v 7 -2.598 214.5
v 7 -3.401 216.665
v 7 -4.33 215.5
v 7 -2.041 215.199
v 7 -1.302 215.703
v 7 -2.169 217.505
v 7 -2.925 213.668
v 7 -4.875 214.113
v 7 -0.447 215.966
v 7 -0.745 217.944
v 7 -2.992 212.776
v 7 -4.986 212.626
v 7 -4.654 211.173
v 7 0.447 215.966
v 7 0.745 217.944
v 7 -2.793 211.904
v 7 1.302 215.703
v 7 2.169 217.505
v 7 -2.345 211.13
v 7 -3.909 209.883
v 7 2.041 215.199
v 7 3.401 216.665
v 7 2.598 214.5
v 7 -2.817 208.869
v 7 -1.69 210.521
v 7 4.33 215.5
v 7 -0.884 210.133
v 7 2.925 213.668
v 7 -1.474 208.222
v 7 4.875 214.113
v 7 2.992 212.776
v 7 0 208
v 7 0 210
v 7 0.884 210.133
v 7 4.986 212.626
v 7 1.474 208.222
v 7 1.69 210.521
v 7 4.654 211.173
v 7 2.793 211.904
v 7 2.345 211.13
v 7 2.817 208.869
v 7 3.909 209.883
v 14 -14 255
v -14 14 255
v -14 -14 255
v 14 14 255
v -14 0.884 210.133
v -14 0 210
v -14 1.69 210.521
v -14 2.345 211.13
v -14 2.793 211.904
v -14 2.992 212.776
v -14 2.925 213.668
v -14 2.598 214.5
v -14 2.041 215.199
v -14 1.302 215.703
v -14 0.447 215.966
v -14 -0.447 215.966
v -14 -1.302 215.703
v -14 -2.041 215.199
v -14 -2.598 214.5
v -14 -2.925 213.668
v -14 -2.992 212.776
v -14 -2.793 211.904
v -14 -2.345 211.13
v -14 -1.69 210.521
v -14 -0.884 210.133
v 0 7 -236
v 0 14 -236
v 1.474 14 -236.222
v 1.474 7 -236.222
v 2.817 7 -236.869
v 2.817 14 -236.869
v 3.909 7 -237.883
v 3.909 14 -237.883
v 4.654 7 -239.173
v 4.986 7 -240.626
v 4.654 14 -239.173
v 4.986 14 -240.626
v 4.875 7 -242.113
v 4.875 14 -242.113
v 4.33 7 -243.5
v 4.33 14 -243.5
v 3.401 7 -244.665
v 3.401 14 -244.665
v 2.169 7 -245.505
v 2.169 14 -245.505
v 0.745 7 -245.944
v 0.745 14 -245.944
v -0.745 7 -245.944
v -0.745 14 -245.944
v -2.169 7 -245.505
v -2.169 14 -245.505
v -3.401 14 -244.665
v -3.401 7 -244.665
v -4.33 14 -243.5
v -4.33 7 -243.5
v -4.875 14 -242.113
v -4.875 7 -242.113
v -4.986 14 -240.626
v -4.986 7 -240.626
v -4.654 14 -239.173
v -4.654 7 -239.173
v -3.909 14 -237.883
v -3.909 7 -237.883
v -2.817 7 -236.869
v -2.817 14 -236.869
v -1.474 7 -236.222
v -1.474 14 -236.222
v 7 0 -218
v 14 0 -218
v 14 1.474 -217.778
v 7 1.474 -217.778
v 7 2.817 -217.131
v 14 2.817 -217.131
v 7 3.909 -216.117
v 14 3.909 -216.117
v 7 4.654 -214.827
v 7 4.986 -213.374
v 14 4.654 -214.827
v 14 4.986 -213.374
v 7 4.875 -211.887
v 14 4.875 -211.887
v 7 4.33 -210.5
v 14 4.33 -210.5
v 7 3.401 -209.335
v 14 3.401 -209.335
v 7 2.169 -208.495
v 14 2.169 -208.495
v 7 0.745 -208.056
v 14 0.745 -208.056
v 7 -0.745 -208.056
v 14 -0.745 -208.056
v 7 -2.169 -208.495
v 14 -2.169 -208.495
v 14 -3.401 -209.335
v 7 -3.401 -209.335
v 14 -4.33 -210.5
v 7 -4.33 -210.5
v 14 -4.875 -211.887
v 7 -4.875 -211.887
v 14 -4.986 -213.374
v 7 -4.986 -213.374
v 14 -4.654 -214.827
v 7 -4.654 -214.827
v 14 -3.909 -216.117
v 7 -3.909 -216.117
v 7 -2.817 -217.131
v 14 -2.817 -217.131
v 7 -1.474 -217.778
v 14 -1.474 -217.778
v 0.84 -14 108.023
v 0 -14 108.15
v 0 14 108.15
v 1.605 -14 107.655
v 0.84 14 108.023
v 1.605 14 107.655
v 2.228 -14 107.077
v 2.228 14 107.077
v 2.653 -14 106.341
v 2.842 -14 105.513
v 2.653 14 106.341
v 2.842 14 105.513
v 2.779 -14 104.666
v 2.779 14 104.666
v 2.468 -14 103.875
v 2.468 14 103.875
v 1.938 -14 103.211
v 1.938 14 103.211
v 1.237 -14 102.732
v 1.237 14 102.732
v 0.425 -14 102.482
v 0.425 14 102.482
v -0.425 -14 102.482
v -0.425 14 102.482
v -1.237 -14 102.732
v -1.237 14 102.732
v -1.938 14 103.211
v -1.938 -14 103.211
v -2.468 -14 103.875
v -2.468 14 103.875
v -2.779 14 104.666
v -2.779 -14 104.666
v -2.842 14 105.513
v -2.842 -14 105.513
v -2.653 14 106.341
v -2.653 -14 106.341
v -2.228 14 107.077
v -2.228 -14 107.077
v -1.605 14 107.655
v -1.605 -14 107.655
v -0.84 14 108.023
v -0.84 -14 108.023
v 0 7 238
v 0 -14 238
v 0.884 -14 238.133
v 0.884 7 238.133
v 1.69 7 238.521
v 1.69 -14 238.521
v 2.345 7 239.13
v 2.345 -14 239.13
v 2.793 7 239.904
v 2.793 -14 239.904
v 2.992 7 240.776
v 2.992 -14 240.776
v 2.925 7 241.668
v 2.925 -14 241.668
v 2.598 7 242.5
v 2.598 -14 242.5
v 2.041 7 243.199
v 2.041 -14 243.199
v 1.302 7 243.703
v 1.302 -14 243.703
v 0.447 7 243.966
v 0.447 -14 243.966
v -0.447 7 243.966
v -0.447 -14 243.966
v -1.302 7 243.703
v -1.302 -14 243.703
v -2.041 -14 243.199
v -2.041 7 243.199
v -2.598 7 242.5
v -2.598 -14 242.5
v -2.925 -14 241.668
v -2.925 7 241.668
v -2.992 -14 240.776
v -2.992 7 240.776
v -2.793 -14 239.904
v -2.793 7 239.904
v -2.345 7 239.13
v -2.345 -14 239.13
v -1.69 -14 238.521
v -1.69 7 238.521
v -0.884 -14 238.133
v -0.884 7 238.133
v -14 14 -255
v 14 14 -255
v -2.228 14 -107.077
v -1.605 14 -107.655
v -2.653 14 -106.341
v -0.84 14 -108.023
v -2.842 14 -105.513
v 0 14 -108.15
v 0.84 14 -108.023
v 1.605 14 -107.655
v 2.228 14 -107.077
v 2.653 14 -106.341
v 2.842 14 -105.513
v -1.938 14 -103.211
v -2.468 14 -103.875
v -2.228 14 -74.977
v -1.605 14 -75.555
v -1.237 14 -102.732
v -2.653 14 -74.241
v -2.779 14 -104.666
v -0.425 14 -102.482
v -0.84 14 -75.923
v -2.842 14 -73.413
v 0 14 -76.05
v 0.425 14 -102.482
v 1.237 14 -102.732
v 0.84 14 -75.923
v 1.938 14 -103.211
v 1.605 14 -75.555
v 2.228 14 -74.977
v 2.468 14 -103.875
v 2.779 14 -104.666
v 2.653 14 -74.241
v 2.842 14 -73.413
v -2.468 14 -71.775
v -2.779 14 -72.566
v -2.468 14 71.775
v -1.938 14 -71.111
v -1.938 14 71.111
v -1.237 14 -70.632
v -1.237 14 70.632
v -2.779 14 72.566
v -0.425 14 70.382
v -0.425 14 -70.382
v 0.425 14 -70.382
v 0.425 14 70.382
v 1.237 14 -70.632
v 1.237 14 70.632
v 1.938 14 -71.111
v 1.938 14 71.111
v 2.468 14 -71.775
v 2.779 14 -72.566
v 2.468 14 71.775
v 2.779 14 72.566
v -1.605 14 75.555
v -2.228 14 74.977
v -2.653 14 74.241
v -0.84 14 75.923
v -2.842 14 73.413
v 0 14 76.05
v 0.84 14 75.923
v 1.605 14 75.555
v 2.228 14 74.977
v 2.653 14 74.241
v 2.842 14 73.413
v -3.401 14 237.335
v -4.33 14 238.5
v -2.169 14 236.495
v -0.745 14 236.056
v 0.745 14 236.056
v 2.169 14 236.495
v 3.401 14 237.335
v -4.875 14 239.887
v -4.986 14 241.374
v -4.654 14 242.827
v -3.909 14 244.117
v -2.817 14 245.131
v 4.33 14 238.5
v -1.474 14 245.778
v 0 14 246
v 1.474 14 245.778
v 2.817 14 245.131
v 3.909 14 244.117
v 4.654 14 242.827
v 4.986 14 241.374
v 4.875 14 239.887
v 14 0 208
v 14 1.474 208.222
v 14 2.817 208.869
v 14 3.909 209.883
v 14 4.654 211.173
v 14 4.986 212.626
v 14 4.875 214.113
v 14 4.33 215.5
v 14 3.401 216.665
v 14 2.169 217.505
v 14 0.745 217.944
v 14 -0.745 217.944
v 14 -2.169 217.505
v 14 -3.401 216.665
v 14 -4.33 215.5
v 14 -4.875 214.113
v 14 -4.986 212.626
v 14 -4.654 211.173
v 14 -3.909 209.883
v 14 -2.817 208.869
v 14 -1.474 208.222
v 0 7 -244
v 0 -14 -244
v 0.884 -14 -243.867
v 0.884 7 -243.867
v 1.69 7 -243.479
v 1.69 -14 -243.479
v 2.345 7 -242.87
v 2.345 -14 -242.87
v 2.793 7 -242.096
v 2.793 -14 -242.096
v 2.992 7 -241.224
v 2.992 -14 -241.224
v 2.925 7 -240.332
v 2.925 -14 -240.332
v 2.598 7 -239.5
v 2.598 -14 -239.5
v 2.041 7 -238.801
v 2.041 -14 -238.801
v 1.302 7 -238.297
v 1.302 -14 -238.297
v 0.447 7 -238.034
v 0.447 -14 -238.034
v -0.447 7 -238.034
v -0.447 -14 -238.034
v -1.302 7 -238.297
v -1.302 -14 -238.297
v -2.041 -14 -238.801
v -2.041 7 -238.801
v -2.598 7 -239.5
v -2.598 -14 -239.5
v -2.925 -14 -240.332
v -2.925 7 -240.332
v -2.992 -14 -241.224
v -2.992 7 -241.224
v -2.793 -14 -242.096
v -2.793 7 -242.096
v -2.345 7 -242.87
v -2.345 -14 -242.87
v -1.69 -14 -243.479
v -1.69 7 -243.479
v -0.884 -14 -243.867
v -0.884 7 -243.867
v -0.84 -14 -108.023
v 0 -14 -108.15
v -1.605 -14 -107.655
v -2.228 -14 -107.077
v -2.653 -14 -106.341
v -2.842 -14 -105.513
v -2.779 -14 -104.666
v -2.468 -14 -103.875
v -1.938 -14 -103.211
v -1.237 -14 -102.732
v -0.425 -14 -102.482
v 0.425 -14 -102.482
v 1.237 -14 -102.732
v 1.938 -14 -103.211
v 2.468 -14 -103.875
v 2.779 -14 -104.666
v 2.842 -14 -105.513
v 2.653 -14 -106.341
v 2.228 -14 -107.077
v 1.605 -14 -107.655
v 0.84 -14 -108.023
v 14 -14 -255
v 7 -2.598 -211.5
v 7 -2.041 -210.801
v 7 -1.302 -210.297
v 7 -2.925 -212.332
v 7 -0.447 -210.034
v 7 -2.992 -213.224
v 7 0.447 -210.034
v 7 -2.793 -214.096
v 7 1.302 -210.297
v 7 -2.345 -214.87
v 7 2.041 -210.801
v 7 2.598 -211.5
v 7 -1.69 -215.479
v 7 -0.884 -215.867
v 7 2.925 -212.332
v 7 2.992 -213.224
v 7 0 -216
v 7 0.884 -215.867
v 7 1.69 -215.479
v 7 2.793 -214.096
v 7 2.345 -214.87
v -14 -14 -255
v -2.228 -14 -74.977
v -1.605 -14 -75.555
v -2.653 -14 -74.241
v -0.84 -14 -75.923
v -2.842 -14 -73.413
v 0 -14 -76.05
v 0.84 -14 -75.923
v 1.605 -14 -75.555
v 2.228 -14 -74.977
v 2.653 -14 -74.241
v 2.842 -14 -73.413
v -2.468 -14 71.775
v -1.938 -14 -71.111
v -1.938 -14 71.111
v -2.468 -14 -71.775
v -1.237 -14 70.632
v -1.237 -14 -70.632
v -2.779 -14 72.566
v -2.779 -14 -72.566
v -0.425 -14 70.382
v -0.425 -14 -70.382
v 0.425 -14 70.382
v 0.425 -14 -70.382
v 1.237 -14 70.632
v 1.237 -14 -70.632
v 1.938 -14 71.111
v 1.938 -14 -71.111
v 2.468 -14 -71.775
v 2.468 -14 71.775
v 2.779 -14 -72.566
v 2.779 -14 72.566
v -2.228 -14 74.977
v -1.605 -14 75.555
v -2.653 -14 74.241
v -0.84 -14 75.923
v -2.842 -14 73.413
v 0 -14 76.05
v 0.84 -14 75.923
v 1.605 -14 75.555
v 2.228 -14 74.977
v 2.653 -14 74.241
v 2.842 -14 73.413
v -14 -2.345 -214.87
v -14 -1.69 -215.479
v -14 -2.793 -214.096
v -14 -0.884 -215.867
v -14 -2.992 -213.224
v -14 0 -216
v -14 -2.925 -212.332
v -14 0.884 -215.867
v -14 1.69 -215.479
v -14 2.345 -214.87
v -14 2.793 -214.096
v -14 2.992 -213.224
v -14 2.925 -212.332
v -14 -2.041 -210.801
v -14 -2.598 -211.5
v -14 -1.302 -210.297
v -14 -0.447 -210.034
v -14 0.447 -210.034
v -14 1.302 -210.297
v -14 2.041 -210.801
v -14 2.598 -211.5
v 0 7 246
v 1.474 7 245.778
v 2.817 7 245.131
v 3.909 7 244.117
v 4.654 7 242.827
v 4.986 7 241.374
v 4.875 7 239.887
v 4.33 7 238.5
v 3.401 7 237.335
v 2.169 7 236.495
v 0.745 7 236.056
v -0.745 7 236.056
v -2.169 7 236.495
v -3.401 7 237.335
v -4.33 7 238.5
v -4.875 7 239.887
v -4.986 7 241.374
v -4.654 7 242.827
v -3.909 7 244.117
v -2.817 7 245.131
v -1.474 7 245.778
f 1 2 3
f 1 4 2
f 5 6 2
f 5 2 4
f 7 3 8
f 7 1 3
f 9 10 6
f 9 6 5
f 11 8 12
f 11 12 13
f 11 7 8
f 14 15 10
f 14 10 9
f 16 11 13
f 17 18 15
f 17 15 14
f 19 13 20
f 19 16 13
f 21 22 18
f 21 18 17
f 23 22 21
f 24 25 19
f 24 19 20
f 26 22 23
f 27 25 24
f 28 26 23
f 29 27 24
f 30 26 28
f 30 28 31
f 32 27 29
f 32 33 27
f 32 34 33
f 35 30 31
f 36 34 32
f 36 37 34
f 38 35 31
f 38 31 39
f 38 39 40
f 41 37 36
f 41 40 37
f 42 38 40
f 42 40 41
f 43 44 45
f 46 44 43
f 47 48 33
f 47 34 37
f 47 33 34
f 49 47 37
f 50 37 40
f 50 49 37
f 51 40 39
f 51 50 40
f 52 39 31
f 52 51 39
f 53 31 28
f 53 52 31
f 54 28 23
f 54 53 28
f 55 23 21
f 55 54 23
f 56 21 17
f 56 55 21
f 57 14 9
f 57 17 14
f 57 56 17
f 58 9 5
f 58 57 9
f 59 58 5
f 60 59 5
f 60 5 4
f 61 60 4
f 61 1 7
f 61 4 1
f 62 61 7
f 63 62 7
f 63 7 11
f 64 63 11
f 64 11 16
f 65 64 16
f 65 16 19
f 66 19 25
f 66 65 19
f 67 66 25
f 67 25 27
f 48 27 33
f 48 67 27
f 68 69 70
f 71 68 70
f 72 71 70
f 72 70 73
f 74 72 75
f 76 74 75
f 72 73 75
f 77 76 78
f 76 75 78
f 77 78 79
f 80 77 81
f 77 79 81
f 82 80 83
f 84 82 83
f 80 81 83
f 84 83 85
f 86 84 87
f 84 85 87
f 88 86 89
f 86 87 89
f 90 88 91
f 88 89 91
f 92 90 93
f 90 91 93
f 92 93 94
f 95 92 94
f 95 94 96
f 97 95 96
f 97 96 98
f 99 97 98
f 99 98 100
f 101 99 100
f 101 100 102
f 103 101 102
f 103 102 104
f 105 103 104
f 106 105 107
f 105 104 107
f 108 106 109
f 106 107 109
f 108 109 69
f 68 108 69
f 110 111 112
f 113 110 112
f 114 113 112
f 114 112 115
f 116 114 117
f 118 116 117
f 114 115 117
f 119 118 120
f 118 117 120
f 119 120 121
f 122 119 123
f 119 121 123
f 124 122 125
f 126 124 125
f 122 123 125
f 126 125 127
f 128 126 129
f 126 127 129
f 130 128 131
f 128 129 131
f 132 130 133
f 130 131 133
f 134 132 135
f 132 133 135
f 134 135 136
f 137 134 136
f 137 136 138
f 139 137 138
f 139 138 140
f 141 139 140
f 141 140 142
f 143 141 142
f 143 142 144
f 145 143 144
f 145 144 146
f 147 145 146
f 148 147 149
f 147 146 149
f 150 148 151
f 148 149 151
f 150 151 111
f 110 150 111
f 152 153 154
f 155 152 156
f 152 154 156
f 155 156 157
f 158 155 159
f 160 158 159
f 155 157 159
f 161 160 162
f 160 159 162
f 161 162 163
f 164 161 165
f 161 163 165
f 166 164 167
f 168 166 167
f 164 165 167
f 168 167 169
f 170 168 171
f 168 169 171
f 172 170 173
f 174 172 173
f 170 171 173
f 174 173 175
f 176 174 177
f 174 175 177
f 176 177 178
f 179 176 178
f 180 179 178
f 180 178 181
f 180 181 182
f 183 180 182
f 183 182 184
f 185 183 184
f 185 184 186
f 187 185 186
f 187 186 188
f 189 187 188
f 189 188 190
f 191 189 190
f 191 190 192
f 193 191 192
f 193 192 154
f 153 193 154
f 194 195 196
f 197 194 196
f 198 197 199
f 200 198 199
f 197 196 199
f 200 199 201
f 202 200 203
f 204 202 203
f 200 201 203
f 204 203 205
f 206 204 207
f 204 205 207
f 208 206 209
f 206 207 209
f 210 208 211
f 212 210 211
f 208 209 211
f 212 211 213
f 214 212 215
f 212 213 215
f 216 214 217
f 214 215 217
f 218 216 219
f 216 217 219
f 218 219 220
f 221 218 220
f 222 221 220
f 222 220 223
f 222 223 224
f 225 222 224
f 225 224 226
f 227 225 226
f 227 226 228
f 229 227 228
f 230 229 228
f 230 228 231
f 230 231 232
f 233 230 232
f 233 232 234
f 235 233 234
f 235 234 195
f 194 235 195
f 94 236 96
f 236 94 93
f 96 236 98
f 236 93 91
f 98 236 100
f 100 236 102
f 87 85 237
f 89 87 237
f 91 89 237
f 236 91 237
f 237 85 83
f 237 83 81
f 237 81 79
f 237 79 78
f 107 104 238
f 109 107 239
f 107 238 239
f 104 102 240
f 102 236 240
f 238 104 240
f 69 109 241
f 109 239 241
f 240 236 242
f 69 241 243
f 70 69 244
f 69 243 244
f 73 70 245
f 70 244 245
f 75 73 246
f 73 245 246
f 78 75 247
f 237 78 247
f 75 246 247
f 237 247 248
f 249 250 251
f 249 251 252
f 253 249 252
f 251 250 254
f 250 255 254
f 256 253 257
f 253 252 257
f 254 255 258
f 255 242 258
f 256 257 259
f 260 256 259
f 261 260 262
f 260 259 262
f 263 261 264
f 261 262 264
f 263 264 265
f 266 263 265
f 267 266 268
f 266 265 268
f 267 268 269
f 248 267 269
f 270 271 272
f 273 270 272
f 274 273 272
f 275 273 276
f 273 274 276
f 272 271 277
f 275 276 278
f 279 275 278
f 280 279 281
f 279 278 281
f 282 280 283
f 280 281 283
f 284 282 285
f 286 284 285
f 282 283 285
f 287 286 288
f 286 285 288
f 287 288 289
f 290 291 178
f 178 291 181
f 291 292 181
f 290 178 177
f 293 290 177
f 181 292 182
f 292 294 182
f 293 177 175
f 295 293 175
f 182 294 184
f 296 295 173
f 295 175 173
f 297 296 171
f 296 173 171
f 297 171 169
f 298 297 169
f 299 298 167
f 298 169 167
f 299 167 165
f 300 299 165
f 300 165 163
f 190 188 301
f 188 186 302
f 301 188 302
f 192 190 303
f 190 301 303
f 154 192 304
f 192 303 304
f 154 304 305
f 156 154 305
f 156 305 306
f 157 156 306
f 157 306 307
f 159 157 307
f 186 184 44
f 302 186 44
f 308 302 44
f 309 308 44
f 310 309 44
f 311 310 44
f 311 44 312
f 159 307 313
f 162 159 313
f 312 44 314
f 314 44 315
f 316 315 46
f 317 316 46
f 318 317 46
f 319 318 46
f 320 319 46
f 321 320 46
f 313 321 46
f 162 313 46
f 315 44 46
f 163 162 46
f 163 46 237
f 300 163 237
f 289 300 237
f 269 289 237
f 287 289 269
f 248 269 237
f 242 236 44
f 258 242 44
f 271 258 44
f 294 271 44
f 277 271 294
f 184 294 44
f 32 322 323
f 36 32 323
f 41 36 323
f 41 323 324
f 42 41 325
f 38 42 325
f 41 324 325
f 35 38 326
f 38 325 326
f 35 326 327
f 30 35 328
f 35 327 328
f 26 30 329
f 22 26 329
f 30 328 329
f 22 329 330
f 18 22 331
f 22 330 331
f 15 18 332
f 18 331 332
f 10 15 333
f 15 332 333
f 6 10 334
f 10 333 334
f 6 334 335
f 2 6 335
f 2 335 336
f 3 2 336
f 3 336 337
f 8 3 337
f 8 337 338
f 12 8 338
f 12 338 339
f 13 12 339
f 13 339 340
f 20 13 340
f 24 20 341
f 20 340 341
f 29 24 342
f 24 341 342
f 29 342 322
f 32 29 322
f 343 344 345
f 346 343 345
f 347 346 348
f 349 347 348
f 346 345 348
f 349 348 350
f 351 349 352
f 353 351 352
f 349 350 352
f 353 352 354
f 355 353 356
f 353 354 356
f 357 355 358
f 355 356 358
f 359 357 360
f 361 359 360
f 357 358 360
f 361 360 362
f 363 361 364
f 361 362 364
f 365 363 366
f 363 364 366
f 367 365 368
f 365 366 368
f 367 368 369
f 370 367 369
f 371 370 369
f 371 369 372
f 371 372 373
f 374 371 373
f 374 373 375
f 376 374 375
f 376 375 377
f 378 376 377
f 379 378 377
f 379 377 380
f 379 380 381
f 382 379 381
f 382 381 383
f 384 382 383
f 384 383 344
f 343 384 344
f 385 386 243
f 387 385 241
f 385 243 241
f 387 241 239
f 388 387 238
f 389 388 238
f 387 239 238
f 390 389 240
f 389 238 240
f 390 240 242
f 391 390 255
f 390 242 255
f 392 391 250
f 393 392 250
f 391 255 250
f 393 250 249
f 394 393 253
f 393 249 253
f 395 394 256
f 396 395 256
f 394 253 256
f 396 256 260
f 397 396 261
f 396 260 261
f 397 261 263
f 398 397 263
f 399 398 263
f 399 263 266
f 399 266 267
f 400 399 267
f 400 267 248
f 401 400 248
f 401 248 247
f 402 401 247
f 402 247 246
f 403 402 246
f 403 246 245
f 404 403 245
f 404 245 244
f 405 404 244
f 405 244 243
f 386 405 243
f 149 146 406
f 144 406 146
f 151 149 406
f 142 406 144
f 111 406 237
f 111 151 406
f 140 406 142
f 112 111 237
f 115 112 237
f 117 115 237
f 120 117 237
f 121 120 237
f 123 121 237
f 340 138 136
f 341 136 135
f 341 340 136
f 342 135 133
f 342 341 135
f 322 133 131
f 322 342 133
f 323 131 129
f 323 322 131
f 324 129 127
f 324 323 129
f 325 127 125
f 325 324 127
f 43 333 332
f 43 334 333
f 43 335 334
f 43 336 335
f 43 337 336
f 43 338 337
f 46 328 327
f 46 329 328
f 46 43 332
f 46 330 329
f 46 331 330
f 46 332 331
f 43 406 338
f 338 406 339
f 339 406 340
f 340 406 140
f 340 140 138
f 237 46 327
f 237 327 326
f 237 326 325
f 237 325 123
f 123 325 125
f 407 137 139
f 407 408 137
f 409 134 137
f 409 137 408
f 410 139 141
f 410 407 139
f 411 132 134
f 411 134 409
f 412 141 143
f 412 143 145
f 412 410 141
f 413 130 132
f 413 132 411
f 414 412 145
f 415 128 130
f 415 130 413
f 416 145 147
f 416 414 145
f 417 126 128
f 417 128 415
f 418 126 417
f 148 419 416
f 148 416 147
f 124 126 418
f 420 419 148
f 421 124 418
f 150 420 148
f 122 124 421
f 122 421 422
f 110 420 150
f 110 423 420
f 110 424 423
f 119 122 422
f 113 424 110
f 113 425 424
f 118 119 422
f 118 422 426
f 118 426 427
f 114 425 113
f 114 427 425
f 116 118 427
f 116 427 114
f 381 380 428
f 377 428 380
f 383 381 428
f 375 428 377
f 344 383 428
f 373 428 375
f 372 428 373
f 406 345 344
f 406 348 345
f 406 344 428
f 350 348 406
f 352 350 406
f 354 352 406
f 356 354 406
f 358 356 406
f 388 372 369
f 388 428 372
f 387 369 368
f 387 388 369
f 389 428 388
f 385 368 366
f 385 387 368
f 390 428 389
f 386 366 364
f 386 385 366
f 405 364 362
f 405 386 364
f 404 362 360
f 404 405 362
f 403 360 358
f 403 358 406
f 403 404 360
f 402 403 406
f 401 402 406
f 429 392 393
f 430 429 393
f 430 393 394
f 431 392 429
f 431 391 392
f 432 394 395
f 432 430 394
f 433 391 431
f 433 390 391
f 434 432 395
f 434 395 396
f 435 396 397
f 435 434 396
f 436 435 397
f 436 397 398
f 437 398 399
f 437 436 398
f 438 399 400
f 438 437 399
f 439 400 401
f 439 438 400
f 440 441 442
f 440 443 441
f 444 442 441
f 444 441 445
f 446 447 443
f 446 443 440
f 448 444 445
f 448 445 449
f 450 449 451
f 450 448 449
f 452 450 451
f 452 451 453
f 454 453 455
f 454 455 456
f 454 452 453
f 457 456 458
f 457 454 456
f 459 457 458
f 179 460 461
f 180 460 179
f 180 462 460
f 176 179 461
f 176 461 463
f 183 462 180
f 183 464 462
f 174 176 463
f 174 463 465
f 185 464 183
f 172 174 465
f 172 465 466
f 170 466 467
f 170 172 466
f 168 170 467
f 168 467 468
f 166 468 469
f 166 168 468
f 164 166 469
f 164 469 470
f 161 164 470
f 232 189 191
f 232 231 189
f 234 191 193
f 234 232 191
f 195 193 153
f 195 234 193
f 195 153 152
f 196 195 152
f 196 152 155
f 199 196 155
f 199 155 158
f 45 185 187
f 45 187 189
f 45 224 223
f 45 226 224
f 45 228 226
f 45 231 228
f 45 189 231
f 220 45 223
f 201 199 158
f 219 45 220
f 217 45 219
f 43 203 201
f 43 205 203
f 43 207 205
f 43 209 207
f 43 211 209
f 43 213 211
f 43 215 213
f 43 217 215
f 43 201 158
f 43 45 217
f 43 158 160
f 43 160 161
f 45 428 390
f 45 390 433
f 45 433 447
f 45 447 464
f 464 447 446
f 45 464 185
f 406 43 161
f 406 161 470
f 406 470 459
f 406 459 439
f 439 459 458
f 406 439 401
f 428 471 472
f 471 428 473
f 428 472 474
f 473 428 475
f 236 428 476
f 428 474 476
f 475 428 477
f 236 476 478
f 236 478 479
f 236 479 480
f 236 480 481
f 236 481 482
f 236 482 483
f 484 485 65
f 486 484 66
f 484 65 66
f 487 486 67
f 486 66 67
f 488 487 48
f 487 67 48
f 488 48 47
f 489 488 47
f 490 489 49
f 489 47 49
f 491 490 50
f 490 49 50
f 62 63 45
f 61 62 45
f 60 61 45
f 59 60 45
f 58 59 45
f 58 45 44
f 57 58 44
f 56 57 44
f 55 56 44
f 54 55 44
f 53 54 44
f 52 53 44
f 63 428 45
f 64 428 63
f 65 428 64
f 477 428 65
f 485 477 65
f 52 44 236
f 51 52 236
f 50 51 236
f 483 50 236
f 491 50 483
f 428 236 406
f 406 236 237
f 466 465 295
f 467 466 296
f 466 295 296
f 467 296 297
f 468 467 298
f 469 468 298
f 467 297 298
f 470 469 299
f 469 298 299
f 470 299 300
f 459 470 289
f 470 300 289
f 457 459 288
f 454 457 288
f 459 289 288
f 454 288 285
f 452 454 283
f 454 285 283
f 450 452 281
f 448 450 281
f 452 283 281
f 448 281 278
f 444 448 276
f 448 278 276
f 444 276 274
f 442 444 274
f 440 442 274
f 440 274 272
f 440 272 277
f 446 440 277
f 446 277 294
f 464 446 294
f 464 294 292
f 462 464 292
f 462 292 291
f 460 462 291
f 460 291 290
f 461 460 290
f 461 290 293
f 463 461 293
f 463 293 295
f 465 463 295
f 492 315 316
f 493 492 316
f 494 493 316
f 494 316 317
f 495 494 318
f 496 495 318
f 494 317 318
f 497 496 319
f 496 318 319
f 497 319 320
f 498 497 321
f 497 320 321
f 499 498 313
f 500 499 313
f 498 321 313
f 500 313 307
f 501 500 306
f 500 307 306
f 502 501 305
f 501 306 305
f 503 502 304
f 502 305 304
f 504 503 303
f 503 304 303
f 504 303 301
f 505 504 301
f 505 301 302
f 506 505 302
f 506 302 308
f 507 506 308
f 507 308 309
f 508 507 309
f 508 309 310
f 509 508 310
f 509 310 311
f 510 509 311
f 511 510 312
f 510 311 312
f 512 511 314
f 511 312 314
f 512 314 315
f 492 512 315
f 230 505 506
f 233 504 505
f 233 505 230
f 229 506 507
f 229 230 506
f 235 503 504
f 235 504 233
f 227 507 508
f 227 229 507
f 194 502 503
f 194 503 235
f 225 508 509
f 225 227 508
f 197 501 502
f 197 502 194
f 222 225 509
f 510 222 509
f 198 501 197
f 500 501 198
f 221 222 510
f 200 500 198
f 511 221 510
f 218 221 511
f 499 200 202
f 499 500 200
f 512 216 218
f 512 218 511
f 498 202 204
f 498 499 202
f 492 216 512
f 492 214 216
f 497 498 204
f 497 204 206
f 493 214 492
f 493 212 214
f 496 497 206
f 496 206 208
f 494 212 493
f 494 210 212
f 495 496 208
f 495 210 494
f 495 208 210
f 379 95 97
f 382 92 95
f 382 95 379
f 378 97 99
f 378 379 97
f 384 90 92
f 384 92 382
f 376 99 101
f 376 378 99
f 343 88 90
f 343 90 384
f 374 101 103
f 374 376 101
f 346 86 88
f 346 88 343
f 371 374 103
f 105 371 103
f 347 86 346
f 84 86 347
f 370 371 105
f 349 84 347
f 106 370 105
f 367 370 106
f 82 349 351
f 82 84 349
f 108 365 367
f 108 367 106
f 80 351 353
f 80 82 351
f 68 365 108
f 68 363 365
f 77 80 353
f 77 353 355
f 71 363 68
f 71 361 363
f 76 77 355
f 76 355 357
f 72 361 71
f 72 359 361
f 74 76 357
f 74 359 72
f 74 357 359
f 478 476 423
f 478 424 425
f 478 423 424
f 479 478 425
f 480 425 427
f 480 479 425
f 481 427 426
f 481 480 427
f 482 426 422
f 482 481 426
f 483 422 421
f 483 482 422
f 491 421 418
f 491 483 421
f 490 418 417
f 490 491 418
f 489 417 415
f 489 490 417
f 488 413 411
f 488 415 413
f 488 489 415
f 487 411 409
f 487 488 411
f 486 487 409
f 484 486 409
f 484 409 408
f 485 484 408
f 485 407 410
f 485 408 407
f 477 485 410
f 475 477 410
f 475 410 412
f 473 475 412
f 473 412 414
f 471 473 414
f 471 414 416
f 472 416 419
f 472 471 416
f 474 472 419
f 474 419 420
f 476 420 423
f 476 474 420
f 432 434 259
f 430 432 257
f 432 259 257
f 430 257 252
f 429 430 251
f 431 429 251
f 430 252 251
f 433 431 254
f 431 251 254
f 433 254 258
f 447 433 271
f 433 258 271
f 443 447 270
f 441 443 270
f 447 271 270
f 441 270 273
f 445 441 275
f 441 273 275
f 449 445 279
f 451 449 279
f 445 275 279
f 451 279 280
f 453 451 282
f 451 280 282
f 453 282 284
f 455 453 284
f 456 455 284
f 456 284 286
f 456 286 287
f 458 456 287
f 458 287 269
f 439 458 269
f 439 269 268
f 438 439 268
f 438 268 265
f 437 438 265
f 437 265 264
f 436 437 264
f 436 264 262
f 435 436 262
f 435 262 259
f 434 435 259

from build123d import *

# Parameters (mm, degrees)
IZIM1_W                     = 28
IZIM1_H                     = 28
Y_KSEKLIK_EKSTR_ZYON1_DEPTH = 255
IZIM2_R                     = 5
KES_EKSTR_ZYON1_DEPTH       = 7
KES_EKSTR_ZYON2_DEPTH       = 257.914382626
KES_EKSTR_ZYON2_DEPTH_BACK  = 257.914382626
IZIM3_R                     = 3
KES_EKSTR_ZYON3_REACH       = 258.914
IZIM4_R                     = 3
IZIM6_R                     = 5
KES_EKSTR_ZYON5_DEPTH       = 7
IZIM7_R                     = 2.85
KES_EKSTR_ZYON6_DEPTH       = 257.914382626


with BuildPart() as part:
    # Çizim1 → Yükseklik-Ekstrüzyon1 (new, symmetric)
    with BuildSketch(Plane.XY):
        Rectangle(IZIM1_W, IZIM1_H)
    extrude(amount=Y_KSEKLIK_EKSTR_ZYON1_DEPTH, both=True)

    # Çizim2 → Kes-Ekstrüzyon1 (cut)
    with BuildSketch(Plane(origin=(14, 0, 0), x_dir=(0, 0, -1), z_dir=(1, 0, 0))):
        with Locations((-213, 0)):
            Circle(IZIM2_R)
        with Locations((213, 0)):
            Circle(IZIM2_R)
    extrude(amount=-KES_EKSTR_ZYON1_DEPTH, mode=Mode.SUBTRACT)

    # Çizim3 → Kes-Ekstrüzyon2 (cut, two sides: drawn at the far end of the back side and taken through both)
    with BuildSketch(Plane(origin=(14, 0, 0), x_dir=(0, 0, -1), z_dir=(1, 0, 0)).offset(-KES_EKSTR_ZYON2_DEPTH_BACK)):
        with Locations((-213, 0)):
            Circle(IZIM3_R)
        with Locations((213, 0)):
            Circle(IZIM3_R)
    extrude(amount=KES_EKSTR_ZYON2_DEPTH + KES_EKSTR_ZYON2_DEPTH_BACK, mode=Mode.SUBTRACT)

    # Çizim4 → Kes-Ekstrüzyon3 (cut, up to next)
    with BuildSketch(Plane.XZ.offset(14), mode=Mode.PRIVATE) as kes_ekstr_zyon3_sk1:
        with Locations(Location((0, -241, 0), (0, 0, 270))):
            Circle(IZIM4_R)
    kes_ekstr_zyon3_tool1 = extrude(kes_ekstr_zyon3_sk1.sketch, amount=-KES_EKSTR_ZYON3_REACH, mode=Mode.PRIVATE) & part.part
    # Çizim4 → Kes-Ekstrüzyon3 (cut, up to next)
    with BuildSketch(Plane.XZ.offset(14), mode=Mode.PRIVATE) as kes_ekstr_zyon3_sk2:
        with Locations(Location((0, 241, 0), (0, 0, 270))):
            Circle(IZIM4_R)
    kes_ekstr_zyon3_tool2 = extrude(kes_ekstr_zyon3_sk2.sketch, amount=-KES_EKSTR_ZYON3_REACH, mode=Mode.PRIVATE) & part.part
    add(kes_ekstr_zyon3_tool1.solids().sort_by_distance((0, -14, -241))[0], mode=Mode.SUBTRACT)
    add(kes_ekstr_zyon3_tool2.solids().sort_by_distance((0, -14, 241))[0], mode=Mode.SUBTRACT)

    # Çizim6 → Kes-Ekstrüzyon5 (cut)
    with BuildSketch(Plane(origin=(0, 14, 0), x_dir=(1, 0, 0), z_dir=(0, 1, 0))):
        with Locations(Location((0, -241, 0), (0, 0, 270))):
            Circle(IZIM6_R)
        with Locations(Location((0, 241, 0), (0, 0, 270))):
            Circle(IZIM6_R)
    extrude(amount=-KES_EKSTR_ZYON5_DEPTH, mode=Mode.SUBTRACT)

    # Çizim7 → Kes-Ekstrüzyon6 (cut, through all)
    with BuildSketch(Plane(origin=(0, 14, 0), x_dir=(1, 0, 0), z_dir=(0, 1, 0))):
        with Locations(Location((0, -105.3, 0), (0, 0, 270))):
            Circle(IZIM7_R)
        with Locations(Location((0, -73.2, 0), (0, 0, 270))):
            Circle(IZIM7_R)
        with Locations(Location((0, 73.2, 0), (0, 0, 90))):
            Circle(IZIM7_R)
        with Locations(Location((0, 105.3, 0), (0, 0, 90))):
            Circle(IZIM7_R)
    extrude(amount=-KES_EKSTR_ZYON6_DEPTH, mode=Mode.SUBTRACT)


solid = part.part
